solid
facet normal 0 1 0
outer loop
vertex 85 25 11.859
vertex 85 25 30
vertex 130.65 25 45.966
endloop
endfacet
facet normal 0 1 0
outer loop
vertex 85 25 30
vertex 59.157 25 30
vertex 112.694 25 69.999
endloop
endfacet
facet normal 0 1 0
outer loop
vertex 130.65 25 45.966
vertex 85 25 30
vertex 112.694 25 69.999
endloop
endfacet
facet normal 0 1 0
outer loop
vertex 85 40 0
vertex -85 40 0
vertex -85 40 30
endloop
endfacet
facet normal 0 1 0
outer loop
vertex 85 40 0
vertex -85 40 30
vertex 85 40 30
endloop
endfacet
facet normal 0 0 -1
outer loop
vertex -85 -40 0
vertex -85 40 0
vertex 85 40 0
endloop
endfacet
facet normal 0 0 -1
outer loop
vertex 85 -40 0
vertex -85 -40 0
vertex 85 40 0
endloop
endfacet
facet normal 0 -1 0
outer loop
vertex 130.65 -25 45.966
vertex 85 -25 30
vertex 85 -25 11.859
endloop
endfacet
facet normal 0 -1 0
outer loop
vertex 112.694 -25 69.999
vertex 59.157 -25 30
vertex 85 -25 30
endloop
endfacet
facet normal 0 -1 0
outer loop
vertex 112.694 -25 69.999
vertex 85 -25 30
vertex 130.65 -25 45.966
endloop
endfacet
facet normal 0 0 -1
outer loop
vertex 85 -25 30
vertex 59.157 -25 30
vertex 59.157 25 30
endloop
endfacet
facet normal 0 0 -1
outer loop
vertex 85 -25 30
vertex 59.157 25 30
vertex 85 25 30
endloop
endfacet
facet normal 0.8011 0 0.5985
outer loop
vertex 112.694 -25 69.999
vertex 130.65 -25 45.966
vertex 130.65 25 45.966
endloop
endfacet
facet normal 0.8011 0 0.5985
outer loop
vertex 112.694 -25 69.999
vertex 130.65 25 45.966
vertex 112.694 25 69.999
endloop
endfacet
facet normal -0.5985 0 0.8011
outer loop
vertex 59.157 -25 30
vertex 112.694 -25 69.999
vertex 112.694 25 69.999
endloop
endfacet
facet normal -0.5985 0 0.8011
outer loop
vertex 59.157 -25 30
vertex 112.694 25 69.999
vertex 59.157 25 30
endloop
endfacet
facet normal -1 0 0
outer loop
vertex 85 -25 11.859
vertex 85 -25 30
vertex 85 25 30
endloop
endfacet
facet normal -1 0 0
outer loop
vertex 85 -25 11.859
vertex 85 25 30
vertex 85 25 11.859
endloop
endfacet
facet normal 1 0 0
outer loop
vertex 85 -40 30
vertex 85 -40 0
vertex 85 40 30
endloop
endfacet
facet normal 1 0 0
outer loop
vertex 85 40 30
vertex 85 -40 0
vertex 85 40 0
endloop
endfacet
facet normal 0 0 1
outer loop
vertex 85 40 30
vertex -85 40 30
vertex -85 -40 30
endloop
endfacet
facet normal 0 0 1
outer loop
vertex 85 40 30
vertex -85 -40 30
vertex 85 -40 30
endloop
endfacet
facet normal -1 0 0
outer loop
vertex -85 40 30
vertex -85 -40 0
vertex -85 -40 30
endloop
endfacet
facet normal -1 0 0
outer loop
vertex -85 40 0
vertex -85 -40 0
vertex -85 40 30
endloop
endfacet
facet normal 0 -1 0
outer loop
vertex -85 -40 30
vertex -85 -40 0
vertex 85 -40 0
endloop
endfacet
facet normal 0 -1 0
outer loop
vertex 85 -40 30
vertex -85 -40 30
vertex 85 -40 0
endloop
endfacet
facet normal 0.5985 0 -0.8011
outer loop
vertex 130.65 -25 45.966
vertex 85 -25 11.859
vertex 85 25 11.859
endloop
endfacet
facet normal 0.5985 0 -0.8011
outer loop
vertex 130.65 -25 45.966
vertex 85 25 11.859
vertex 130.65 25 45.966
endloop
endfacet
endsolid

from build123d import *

# Parameters (mm, degrees)
F0_W     = 170
F0_H     = 80
F1_DEPTH = 30
F3_DEPTH = 61.7
F4_DEPTH = 14.1
F7_DEPTH = 3.3
F8_DEPTH = 0.9


with BuildPart() as f1:
    # F0 (on Top) → F1 (new body)
    with BuildSketch(Plane.XY):
        Rectangle(F0_W, F0_H)
    extrude(amount=F1_DEPTH)


with BuildPart() as f3:
    # F2 (on face) → F3 (new body)
    with BuildSketch(Plane.XZ.offset(40)):
        Polygon((112.6936972141, 69.9990615249), (59.1574877457, 30), (85, 30), (85, 11.8593943491), (130.649682243, 45.9661132737), align=None)
    extrude(amount=-F3_DEPTH)

    # F4 (cut): a face of the model
    f4_faces = [f3.faces().sort_by_distance(p)[0] for p in [
        (99.5026263907, -40, 42.0152443758),
    ]]
    extrude(f4_faces, amount=-F4_DEPTH, mode=Mode.SUBTRACT)

    # F7 (add, through all): a face of the model
    f7_faces = [f3.faces().sort_by_distance(p)[0] for p in [
        (99.5026263907, 21.7, 42.0152443758),
    ]]
    extrude(f7_faces, amount=F7_DEPTH)

    # F8 (cut, through all): a face of the model
    f8_faces = [f3.faces().sort_by_distance(p)[0] for p in [
        (99.5026263907, -25.9, 42.0152443758),
    ]]
    extrude(f8_faces, amount=-F8_DEPTH, mode=Mode.SUBTRACT)


solid = Compound([f1.part, f3.part])
